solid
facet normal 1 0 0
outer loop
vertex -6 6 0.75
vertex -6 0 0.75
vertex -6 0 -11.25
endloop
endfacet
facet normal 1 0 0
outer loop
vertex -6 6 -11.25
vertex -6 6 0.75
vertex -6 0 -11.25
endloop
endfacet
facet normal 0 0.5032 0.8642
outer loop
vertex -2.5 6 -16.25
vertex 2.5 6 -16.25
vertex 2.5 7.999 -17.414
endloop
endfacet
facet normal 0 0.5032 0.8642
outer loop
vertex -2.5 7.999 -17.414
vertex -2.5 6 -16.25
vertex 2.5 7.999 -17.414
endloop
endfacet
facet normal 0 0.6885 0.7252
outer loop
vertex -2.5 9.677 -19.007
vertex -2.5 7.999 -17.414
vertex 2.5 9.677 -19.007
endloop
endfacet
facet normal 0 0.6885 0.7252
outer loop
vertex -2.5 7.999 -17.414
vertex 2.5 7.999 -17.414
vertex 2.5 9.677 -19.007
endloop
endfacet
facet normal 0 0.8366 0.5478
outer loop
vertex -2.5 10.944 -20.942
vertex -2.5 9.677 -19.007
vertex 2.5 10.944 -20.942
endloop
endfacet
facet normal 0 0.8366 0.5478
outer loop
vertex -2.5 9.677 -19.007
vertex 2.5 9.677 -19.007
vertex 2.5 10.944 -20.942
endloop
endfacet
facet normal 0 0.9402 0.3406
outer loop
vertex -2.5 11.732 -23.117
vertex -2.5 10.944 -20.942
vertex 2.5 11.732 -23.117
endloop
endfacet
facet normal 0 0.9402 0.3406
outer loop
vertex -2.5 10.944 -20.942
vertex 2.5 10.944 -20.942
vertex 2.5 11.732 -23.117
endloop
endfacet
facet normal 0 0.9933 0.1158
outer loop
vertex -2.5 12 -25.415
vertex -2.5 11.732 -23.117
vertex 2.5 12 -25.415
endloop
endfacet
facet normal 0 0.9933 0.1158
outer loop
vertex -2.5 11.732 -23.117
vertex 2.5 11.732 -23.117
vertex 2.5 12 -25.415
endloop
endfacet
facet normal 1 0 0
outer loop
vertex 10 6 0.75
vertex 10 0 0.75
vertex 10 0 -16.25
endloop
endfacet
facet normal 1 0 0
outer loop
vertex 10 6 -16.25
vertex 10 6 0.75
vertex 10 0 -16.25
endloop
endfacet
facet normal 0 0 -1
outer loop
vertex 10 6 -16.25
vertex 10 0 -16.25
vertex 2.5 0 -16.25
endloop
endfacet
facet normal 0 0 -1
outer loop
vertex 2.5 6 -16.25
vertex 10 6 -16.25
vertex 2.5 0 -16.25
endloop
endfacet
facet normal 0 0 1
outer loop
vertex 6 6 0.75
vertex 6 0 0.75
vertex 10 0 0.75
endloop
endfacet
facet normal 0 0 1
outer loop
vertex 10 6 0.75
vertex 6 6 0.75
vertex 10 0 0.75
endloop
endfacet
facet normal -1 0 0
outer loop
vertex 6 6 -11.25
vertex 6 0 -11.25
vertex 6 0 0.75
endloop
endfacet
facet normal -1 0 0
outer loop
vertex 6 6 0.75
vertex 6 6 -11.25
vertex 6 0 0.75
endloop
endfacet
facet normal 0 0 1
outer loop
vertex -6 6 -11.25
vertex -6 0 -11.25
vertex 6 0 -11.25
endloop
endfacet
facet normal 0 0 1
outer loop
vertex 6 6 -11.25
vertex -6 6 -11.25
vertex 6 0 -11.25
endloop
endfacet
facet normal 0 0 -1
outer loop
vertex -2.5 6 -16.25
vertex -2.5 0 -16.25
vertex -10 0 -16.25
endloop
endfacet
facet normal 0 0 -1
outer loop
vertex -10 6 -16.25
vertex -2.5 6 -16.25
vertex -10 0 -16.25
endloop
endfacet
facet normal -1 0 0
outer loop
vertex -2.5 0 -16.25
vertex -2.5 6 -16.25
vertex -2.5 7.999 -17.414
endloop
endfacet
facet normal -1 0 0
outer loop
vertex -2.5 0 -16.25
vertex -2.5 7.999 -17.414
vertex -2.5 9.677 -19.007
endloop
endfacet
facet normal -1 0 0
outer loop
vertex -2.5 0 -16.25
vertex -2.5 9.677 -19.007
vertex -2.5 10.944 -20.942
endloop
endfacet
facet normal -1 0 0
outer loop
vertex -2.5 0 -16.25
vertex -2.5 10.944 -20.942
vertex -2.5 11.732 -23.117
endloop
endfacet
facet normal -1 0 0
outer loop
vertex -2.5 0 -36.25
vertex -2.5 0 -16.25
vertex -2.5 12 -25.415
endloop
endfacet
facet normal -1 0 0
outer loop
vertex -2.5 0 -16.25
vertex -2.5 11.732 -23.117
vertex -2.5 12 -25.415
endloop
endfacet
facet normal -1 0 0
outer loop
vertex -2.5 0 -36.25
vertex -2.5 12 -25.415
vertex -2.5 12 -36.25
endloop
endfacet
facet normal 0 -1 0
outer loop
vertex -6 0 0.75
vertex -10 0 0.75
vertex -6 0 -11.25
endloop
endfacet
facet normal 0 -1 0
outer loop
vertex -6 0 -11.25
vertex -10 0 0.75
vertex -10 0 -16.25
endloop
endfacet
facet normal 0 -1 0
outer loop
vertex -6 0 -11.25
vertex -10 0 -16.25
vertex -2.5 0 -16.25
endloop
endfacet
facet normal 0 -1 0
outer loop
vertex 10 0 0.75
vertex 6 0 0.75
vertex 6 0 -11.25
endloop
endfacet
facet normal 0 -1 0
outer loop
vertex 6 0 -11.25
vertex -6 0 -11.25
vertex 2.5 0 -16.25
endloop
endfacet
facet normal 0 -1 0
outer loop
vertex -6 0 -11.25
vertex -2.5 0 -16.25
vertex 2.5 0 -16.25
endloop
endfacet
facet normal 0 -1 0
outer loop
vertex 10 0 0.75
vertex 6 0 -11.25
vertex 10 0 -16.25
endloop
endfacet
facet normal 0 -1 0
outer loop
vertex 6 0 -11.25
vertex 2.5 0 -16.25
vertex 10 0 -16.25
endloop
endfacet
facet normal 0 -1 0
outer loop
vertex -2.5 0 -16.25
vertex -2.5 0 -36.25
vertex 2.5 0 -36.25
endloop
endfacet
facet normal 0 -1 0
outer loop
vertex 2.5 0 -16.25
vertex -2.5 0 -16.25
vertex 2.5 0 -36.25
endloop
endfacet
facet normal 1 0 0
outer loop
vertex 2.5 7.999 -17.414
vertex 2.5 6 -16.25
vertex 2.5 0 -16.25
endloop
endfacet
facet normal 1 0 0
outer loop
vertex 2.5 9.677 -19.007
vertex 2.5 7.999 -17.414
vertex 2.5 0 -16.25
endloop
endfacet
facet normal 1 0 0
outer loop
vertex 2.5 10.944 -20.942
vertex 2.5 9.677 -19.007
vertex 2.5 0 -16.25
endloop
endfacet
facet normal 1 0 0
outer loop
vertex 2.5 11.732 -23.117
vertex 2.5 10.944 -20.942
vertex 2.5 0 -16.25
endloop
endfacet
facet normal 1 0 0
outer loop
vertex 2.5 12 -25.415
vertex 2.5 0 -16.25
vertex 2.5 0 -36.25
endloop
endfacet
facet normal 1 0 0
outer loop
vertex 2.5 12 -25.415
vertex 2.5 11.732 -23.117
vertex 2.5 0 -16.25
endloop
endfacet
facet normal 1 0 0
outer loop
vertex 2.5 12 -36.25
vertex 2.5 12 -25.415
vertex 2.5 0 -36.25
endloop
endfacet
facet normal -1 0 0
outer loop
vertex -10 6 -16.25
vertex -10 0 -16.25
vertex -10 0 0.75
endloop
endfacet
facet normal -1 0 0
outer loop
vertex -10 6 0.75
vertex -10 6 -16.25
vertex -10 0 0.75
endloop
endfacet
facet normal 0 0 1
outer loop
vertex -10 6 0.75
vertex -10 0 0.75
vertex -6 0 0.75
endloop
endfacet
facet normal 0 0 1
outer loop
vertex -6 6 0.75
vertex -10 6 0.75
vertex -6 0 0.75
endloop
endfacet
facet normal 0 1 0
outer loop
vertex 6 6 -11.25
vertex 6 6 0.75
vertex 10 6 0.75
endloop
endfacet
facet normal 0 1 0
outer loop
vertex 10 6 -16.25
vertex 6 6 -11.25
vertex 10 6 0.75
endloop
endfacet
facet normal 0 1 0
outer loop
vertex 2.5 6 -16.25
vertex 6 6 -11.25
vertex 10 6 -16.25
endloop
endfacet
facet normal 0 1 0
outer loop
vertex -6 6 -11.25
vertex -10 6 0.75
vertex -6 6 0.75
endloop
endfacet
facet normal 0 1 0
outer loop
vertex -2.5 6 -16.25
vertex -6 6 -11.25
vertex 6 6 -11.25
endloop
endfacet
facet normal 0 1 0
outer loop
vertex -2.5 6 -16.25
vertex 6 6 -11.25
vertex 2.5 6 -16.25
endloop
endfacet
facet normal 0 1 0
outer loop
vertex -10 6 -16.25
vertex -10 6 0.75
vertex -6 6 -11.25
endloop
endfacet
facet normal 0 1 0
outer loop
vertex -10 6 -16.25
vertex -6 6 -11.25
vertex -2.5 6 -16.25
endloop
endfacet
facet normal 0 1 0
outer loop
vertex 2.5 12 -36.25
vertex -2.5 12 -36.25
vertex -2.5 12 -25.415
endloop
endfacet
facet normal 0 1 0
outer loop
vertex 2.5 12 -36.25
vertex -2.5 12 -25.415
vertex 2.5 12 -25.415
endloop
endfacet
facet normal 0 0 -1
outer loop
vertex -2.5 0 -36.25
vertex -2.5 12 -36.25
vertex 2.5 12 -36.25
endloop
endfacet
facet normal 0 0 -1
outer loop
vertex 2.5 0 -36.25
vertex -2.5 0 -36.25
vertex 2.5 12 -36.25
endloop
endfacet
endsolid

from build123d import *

# Parameters (mm, degrees)
BOSS_EXTRUDE1_DEPTH     = 12
SKETCH3_W               = 5
SKETCH3_H               = 20
BOSS_EXTRUDE2_DEPTH     = 12
CUT_EXTRUDE1_DEPTH      = 44.1052491
CUT_EXTRUDE1_DEPTH_BACK = 44.1052491
SKETCH4_W               = 17
SKETCH4_H               = 6
FILLET1_R               = 10


with BuildPart() as part:
    # Sketch2 → Boss-Extrude1 (new body)
    with BuildSketch(Plane(origin=(0, 0, 0), x_dir=(1, 0, 0), z_dir=(0, 1, 0))):
        Polygon((-6, -0.75), (-6, 11.25), (6, 11.25), (6, -0.75), (10, -0.75), (10, 16.25), (-10, 16.25), (-10, -0.75), align=None)
    extrude(amount=BOSS_EXTRUDE1_DEPTH)

    # Sketch3 → Boss-Extrude2 (add)
    with BuildSketch(Plane(origin=(0, 12, 0), x_dir=(1, 0, 0), z_dir=(0, 1, 0))):
        with Locations((0, 26.25)):
            Rectangle(SKETCH3_W, SKETCH3_H)
    extrude(amount=-BOSS_EXTRUDE2_DEPTH)

    # Sketch4 → Cut-Extrude1 (cut, two sides: drawn at the far end of the back side and taken through both)
    with BuildSketch(Plane(origin=(10, 0, 0), x_dir=(0, 0, -1), z_dir=(1, 0, 0)).offset(-CUT_EXTRUDE1_DEPTH_BACK)):
        with Locations((7.75, 9)):
            Rectangle(SKETCH4_W, SKETCH4_H)
    extrude(amount=CUT_EXTRUDE1_DEPTH + CUT_EXTRUDE1_DEPTH_BACK, mode=Mode.SUBTRACT)

    # Fillet1
    # the kernel refuses this fillet: 10 mm, written as the material it takes off along each edge
    with BuildSketch(Plane(origin=(25.412878475, 12, -16.25), x_dir=(0, -1, 0), z_dir=(-1, 0, 0))) as fillet1_piece_1:
        with BuildLine():
            CenterArc((10, -9.16515139), FILLET1_R, 113.578178478, 66.421821522)
            Line((0, -9.16515139), (-0.2, -9.16515139))
            Line((-0.2, -9.16515139), (-0.2, 0))
            Line((-0.2, 0), (0, 0.2))
            ThreePointArc((0, 0.2), (3, 0.2), (5.92, 0.183303028))
            Line((5.92, 0.183303028), (6, 0))
        make_face()
    extrude(amount=50.82575695, mode=Mode.SUBTRACT)


solid = part.part
